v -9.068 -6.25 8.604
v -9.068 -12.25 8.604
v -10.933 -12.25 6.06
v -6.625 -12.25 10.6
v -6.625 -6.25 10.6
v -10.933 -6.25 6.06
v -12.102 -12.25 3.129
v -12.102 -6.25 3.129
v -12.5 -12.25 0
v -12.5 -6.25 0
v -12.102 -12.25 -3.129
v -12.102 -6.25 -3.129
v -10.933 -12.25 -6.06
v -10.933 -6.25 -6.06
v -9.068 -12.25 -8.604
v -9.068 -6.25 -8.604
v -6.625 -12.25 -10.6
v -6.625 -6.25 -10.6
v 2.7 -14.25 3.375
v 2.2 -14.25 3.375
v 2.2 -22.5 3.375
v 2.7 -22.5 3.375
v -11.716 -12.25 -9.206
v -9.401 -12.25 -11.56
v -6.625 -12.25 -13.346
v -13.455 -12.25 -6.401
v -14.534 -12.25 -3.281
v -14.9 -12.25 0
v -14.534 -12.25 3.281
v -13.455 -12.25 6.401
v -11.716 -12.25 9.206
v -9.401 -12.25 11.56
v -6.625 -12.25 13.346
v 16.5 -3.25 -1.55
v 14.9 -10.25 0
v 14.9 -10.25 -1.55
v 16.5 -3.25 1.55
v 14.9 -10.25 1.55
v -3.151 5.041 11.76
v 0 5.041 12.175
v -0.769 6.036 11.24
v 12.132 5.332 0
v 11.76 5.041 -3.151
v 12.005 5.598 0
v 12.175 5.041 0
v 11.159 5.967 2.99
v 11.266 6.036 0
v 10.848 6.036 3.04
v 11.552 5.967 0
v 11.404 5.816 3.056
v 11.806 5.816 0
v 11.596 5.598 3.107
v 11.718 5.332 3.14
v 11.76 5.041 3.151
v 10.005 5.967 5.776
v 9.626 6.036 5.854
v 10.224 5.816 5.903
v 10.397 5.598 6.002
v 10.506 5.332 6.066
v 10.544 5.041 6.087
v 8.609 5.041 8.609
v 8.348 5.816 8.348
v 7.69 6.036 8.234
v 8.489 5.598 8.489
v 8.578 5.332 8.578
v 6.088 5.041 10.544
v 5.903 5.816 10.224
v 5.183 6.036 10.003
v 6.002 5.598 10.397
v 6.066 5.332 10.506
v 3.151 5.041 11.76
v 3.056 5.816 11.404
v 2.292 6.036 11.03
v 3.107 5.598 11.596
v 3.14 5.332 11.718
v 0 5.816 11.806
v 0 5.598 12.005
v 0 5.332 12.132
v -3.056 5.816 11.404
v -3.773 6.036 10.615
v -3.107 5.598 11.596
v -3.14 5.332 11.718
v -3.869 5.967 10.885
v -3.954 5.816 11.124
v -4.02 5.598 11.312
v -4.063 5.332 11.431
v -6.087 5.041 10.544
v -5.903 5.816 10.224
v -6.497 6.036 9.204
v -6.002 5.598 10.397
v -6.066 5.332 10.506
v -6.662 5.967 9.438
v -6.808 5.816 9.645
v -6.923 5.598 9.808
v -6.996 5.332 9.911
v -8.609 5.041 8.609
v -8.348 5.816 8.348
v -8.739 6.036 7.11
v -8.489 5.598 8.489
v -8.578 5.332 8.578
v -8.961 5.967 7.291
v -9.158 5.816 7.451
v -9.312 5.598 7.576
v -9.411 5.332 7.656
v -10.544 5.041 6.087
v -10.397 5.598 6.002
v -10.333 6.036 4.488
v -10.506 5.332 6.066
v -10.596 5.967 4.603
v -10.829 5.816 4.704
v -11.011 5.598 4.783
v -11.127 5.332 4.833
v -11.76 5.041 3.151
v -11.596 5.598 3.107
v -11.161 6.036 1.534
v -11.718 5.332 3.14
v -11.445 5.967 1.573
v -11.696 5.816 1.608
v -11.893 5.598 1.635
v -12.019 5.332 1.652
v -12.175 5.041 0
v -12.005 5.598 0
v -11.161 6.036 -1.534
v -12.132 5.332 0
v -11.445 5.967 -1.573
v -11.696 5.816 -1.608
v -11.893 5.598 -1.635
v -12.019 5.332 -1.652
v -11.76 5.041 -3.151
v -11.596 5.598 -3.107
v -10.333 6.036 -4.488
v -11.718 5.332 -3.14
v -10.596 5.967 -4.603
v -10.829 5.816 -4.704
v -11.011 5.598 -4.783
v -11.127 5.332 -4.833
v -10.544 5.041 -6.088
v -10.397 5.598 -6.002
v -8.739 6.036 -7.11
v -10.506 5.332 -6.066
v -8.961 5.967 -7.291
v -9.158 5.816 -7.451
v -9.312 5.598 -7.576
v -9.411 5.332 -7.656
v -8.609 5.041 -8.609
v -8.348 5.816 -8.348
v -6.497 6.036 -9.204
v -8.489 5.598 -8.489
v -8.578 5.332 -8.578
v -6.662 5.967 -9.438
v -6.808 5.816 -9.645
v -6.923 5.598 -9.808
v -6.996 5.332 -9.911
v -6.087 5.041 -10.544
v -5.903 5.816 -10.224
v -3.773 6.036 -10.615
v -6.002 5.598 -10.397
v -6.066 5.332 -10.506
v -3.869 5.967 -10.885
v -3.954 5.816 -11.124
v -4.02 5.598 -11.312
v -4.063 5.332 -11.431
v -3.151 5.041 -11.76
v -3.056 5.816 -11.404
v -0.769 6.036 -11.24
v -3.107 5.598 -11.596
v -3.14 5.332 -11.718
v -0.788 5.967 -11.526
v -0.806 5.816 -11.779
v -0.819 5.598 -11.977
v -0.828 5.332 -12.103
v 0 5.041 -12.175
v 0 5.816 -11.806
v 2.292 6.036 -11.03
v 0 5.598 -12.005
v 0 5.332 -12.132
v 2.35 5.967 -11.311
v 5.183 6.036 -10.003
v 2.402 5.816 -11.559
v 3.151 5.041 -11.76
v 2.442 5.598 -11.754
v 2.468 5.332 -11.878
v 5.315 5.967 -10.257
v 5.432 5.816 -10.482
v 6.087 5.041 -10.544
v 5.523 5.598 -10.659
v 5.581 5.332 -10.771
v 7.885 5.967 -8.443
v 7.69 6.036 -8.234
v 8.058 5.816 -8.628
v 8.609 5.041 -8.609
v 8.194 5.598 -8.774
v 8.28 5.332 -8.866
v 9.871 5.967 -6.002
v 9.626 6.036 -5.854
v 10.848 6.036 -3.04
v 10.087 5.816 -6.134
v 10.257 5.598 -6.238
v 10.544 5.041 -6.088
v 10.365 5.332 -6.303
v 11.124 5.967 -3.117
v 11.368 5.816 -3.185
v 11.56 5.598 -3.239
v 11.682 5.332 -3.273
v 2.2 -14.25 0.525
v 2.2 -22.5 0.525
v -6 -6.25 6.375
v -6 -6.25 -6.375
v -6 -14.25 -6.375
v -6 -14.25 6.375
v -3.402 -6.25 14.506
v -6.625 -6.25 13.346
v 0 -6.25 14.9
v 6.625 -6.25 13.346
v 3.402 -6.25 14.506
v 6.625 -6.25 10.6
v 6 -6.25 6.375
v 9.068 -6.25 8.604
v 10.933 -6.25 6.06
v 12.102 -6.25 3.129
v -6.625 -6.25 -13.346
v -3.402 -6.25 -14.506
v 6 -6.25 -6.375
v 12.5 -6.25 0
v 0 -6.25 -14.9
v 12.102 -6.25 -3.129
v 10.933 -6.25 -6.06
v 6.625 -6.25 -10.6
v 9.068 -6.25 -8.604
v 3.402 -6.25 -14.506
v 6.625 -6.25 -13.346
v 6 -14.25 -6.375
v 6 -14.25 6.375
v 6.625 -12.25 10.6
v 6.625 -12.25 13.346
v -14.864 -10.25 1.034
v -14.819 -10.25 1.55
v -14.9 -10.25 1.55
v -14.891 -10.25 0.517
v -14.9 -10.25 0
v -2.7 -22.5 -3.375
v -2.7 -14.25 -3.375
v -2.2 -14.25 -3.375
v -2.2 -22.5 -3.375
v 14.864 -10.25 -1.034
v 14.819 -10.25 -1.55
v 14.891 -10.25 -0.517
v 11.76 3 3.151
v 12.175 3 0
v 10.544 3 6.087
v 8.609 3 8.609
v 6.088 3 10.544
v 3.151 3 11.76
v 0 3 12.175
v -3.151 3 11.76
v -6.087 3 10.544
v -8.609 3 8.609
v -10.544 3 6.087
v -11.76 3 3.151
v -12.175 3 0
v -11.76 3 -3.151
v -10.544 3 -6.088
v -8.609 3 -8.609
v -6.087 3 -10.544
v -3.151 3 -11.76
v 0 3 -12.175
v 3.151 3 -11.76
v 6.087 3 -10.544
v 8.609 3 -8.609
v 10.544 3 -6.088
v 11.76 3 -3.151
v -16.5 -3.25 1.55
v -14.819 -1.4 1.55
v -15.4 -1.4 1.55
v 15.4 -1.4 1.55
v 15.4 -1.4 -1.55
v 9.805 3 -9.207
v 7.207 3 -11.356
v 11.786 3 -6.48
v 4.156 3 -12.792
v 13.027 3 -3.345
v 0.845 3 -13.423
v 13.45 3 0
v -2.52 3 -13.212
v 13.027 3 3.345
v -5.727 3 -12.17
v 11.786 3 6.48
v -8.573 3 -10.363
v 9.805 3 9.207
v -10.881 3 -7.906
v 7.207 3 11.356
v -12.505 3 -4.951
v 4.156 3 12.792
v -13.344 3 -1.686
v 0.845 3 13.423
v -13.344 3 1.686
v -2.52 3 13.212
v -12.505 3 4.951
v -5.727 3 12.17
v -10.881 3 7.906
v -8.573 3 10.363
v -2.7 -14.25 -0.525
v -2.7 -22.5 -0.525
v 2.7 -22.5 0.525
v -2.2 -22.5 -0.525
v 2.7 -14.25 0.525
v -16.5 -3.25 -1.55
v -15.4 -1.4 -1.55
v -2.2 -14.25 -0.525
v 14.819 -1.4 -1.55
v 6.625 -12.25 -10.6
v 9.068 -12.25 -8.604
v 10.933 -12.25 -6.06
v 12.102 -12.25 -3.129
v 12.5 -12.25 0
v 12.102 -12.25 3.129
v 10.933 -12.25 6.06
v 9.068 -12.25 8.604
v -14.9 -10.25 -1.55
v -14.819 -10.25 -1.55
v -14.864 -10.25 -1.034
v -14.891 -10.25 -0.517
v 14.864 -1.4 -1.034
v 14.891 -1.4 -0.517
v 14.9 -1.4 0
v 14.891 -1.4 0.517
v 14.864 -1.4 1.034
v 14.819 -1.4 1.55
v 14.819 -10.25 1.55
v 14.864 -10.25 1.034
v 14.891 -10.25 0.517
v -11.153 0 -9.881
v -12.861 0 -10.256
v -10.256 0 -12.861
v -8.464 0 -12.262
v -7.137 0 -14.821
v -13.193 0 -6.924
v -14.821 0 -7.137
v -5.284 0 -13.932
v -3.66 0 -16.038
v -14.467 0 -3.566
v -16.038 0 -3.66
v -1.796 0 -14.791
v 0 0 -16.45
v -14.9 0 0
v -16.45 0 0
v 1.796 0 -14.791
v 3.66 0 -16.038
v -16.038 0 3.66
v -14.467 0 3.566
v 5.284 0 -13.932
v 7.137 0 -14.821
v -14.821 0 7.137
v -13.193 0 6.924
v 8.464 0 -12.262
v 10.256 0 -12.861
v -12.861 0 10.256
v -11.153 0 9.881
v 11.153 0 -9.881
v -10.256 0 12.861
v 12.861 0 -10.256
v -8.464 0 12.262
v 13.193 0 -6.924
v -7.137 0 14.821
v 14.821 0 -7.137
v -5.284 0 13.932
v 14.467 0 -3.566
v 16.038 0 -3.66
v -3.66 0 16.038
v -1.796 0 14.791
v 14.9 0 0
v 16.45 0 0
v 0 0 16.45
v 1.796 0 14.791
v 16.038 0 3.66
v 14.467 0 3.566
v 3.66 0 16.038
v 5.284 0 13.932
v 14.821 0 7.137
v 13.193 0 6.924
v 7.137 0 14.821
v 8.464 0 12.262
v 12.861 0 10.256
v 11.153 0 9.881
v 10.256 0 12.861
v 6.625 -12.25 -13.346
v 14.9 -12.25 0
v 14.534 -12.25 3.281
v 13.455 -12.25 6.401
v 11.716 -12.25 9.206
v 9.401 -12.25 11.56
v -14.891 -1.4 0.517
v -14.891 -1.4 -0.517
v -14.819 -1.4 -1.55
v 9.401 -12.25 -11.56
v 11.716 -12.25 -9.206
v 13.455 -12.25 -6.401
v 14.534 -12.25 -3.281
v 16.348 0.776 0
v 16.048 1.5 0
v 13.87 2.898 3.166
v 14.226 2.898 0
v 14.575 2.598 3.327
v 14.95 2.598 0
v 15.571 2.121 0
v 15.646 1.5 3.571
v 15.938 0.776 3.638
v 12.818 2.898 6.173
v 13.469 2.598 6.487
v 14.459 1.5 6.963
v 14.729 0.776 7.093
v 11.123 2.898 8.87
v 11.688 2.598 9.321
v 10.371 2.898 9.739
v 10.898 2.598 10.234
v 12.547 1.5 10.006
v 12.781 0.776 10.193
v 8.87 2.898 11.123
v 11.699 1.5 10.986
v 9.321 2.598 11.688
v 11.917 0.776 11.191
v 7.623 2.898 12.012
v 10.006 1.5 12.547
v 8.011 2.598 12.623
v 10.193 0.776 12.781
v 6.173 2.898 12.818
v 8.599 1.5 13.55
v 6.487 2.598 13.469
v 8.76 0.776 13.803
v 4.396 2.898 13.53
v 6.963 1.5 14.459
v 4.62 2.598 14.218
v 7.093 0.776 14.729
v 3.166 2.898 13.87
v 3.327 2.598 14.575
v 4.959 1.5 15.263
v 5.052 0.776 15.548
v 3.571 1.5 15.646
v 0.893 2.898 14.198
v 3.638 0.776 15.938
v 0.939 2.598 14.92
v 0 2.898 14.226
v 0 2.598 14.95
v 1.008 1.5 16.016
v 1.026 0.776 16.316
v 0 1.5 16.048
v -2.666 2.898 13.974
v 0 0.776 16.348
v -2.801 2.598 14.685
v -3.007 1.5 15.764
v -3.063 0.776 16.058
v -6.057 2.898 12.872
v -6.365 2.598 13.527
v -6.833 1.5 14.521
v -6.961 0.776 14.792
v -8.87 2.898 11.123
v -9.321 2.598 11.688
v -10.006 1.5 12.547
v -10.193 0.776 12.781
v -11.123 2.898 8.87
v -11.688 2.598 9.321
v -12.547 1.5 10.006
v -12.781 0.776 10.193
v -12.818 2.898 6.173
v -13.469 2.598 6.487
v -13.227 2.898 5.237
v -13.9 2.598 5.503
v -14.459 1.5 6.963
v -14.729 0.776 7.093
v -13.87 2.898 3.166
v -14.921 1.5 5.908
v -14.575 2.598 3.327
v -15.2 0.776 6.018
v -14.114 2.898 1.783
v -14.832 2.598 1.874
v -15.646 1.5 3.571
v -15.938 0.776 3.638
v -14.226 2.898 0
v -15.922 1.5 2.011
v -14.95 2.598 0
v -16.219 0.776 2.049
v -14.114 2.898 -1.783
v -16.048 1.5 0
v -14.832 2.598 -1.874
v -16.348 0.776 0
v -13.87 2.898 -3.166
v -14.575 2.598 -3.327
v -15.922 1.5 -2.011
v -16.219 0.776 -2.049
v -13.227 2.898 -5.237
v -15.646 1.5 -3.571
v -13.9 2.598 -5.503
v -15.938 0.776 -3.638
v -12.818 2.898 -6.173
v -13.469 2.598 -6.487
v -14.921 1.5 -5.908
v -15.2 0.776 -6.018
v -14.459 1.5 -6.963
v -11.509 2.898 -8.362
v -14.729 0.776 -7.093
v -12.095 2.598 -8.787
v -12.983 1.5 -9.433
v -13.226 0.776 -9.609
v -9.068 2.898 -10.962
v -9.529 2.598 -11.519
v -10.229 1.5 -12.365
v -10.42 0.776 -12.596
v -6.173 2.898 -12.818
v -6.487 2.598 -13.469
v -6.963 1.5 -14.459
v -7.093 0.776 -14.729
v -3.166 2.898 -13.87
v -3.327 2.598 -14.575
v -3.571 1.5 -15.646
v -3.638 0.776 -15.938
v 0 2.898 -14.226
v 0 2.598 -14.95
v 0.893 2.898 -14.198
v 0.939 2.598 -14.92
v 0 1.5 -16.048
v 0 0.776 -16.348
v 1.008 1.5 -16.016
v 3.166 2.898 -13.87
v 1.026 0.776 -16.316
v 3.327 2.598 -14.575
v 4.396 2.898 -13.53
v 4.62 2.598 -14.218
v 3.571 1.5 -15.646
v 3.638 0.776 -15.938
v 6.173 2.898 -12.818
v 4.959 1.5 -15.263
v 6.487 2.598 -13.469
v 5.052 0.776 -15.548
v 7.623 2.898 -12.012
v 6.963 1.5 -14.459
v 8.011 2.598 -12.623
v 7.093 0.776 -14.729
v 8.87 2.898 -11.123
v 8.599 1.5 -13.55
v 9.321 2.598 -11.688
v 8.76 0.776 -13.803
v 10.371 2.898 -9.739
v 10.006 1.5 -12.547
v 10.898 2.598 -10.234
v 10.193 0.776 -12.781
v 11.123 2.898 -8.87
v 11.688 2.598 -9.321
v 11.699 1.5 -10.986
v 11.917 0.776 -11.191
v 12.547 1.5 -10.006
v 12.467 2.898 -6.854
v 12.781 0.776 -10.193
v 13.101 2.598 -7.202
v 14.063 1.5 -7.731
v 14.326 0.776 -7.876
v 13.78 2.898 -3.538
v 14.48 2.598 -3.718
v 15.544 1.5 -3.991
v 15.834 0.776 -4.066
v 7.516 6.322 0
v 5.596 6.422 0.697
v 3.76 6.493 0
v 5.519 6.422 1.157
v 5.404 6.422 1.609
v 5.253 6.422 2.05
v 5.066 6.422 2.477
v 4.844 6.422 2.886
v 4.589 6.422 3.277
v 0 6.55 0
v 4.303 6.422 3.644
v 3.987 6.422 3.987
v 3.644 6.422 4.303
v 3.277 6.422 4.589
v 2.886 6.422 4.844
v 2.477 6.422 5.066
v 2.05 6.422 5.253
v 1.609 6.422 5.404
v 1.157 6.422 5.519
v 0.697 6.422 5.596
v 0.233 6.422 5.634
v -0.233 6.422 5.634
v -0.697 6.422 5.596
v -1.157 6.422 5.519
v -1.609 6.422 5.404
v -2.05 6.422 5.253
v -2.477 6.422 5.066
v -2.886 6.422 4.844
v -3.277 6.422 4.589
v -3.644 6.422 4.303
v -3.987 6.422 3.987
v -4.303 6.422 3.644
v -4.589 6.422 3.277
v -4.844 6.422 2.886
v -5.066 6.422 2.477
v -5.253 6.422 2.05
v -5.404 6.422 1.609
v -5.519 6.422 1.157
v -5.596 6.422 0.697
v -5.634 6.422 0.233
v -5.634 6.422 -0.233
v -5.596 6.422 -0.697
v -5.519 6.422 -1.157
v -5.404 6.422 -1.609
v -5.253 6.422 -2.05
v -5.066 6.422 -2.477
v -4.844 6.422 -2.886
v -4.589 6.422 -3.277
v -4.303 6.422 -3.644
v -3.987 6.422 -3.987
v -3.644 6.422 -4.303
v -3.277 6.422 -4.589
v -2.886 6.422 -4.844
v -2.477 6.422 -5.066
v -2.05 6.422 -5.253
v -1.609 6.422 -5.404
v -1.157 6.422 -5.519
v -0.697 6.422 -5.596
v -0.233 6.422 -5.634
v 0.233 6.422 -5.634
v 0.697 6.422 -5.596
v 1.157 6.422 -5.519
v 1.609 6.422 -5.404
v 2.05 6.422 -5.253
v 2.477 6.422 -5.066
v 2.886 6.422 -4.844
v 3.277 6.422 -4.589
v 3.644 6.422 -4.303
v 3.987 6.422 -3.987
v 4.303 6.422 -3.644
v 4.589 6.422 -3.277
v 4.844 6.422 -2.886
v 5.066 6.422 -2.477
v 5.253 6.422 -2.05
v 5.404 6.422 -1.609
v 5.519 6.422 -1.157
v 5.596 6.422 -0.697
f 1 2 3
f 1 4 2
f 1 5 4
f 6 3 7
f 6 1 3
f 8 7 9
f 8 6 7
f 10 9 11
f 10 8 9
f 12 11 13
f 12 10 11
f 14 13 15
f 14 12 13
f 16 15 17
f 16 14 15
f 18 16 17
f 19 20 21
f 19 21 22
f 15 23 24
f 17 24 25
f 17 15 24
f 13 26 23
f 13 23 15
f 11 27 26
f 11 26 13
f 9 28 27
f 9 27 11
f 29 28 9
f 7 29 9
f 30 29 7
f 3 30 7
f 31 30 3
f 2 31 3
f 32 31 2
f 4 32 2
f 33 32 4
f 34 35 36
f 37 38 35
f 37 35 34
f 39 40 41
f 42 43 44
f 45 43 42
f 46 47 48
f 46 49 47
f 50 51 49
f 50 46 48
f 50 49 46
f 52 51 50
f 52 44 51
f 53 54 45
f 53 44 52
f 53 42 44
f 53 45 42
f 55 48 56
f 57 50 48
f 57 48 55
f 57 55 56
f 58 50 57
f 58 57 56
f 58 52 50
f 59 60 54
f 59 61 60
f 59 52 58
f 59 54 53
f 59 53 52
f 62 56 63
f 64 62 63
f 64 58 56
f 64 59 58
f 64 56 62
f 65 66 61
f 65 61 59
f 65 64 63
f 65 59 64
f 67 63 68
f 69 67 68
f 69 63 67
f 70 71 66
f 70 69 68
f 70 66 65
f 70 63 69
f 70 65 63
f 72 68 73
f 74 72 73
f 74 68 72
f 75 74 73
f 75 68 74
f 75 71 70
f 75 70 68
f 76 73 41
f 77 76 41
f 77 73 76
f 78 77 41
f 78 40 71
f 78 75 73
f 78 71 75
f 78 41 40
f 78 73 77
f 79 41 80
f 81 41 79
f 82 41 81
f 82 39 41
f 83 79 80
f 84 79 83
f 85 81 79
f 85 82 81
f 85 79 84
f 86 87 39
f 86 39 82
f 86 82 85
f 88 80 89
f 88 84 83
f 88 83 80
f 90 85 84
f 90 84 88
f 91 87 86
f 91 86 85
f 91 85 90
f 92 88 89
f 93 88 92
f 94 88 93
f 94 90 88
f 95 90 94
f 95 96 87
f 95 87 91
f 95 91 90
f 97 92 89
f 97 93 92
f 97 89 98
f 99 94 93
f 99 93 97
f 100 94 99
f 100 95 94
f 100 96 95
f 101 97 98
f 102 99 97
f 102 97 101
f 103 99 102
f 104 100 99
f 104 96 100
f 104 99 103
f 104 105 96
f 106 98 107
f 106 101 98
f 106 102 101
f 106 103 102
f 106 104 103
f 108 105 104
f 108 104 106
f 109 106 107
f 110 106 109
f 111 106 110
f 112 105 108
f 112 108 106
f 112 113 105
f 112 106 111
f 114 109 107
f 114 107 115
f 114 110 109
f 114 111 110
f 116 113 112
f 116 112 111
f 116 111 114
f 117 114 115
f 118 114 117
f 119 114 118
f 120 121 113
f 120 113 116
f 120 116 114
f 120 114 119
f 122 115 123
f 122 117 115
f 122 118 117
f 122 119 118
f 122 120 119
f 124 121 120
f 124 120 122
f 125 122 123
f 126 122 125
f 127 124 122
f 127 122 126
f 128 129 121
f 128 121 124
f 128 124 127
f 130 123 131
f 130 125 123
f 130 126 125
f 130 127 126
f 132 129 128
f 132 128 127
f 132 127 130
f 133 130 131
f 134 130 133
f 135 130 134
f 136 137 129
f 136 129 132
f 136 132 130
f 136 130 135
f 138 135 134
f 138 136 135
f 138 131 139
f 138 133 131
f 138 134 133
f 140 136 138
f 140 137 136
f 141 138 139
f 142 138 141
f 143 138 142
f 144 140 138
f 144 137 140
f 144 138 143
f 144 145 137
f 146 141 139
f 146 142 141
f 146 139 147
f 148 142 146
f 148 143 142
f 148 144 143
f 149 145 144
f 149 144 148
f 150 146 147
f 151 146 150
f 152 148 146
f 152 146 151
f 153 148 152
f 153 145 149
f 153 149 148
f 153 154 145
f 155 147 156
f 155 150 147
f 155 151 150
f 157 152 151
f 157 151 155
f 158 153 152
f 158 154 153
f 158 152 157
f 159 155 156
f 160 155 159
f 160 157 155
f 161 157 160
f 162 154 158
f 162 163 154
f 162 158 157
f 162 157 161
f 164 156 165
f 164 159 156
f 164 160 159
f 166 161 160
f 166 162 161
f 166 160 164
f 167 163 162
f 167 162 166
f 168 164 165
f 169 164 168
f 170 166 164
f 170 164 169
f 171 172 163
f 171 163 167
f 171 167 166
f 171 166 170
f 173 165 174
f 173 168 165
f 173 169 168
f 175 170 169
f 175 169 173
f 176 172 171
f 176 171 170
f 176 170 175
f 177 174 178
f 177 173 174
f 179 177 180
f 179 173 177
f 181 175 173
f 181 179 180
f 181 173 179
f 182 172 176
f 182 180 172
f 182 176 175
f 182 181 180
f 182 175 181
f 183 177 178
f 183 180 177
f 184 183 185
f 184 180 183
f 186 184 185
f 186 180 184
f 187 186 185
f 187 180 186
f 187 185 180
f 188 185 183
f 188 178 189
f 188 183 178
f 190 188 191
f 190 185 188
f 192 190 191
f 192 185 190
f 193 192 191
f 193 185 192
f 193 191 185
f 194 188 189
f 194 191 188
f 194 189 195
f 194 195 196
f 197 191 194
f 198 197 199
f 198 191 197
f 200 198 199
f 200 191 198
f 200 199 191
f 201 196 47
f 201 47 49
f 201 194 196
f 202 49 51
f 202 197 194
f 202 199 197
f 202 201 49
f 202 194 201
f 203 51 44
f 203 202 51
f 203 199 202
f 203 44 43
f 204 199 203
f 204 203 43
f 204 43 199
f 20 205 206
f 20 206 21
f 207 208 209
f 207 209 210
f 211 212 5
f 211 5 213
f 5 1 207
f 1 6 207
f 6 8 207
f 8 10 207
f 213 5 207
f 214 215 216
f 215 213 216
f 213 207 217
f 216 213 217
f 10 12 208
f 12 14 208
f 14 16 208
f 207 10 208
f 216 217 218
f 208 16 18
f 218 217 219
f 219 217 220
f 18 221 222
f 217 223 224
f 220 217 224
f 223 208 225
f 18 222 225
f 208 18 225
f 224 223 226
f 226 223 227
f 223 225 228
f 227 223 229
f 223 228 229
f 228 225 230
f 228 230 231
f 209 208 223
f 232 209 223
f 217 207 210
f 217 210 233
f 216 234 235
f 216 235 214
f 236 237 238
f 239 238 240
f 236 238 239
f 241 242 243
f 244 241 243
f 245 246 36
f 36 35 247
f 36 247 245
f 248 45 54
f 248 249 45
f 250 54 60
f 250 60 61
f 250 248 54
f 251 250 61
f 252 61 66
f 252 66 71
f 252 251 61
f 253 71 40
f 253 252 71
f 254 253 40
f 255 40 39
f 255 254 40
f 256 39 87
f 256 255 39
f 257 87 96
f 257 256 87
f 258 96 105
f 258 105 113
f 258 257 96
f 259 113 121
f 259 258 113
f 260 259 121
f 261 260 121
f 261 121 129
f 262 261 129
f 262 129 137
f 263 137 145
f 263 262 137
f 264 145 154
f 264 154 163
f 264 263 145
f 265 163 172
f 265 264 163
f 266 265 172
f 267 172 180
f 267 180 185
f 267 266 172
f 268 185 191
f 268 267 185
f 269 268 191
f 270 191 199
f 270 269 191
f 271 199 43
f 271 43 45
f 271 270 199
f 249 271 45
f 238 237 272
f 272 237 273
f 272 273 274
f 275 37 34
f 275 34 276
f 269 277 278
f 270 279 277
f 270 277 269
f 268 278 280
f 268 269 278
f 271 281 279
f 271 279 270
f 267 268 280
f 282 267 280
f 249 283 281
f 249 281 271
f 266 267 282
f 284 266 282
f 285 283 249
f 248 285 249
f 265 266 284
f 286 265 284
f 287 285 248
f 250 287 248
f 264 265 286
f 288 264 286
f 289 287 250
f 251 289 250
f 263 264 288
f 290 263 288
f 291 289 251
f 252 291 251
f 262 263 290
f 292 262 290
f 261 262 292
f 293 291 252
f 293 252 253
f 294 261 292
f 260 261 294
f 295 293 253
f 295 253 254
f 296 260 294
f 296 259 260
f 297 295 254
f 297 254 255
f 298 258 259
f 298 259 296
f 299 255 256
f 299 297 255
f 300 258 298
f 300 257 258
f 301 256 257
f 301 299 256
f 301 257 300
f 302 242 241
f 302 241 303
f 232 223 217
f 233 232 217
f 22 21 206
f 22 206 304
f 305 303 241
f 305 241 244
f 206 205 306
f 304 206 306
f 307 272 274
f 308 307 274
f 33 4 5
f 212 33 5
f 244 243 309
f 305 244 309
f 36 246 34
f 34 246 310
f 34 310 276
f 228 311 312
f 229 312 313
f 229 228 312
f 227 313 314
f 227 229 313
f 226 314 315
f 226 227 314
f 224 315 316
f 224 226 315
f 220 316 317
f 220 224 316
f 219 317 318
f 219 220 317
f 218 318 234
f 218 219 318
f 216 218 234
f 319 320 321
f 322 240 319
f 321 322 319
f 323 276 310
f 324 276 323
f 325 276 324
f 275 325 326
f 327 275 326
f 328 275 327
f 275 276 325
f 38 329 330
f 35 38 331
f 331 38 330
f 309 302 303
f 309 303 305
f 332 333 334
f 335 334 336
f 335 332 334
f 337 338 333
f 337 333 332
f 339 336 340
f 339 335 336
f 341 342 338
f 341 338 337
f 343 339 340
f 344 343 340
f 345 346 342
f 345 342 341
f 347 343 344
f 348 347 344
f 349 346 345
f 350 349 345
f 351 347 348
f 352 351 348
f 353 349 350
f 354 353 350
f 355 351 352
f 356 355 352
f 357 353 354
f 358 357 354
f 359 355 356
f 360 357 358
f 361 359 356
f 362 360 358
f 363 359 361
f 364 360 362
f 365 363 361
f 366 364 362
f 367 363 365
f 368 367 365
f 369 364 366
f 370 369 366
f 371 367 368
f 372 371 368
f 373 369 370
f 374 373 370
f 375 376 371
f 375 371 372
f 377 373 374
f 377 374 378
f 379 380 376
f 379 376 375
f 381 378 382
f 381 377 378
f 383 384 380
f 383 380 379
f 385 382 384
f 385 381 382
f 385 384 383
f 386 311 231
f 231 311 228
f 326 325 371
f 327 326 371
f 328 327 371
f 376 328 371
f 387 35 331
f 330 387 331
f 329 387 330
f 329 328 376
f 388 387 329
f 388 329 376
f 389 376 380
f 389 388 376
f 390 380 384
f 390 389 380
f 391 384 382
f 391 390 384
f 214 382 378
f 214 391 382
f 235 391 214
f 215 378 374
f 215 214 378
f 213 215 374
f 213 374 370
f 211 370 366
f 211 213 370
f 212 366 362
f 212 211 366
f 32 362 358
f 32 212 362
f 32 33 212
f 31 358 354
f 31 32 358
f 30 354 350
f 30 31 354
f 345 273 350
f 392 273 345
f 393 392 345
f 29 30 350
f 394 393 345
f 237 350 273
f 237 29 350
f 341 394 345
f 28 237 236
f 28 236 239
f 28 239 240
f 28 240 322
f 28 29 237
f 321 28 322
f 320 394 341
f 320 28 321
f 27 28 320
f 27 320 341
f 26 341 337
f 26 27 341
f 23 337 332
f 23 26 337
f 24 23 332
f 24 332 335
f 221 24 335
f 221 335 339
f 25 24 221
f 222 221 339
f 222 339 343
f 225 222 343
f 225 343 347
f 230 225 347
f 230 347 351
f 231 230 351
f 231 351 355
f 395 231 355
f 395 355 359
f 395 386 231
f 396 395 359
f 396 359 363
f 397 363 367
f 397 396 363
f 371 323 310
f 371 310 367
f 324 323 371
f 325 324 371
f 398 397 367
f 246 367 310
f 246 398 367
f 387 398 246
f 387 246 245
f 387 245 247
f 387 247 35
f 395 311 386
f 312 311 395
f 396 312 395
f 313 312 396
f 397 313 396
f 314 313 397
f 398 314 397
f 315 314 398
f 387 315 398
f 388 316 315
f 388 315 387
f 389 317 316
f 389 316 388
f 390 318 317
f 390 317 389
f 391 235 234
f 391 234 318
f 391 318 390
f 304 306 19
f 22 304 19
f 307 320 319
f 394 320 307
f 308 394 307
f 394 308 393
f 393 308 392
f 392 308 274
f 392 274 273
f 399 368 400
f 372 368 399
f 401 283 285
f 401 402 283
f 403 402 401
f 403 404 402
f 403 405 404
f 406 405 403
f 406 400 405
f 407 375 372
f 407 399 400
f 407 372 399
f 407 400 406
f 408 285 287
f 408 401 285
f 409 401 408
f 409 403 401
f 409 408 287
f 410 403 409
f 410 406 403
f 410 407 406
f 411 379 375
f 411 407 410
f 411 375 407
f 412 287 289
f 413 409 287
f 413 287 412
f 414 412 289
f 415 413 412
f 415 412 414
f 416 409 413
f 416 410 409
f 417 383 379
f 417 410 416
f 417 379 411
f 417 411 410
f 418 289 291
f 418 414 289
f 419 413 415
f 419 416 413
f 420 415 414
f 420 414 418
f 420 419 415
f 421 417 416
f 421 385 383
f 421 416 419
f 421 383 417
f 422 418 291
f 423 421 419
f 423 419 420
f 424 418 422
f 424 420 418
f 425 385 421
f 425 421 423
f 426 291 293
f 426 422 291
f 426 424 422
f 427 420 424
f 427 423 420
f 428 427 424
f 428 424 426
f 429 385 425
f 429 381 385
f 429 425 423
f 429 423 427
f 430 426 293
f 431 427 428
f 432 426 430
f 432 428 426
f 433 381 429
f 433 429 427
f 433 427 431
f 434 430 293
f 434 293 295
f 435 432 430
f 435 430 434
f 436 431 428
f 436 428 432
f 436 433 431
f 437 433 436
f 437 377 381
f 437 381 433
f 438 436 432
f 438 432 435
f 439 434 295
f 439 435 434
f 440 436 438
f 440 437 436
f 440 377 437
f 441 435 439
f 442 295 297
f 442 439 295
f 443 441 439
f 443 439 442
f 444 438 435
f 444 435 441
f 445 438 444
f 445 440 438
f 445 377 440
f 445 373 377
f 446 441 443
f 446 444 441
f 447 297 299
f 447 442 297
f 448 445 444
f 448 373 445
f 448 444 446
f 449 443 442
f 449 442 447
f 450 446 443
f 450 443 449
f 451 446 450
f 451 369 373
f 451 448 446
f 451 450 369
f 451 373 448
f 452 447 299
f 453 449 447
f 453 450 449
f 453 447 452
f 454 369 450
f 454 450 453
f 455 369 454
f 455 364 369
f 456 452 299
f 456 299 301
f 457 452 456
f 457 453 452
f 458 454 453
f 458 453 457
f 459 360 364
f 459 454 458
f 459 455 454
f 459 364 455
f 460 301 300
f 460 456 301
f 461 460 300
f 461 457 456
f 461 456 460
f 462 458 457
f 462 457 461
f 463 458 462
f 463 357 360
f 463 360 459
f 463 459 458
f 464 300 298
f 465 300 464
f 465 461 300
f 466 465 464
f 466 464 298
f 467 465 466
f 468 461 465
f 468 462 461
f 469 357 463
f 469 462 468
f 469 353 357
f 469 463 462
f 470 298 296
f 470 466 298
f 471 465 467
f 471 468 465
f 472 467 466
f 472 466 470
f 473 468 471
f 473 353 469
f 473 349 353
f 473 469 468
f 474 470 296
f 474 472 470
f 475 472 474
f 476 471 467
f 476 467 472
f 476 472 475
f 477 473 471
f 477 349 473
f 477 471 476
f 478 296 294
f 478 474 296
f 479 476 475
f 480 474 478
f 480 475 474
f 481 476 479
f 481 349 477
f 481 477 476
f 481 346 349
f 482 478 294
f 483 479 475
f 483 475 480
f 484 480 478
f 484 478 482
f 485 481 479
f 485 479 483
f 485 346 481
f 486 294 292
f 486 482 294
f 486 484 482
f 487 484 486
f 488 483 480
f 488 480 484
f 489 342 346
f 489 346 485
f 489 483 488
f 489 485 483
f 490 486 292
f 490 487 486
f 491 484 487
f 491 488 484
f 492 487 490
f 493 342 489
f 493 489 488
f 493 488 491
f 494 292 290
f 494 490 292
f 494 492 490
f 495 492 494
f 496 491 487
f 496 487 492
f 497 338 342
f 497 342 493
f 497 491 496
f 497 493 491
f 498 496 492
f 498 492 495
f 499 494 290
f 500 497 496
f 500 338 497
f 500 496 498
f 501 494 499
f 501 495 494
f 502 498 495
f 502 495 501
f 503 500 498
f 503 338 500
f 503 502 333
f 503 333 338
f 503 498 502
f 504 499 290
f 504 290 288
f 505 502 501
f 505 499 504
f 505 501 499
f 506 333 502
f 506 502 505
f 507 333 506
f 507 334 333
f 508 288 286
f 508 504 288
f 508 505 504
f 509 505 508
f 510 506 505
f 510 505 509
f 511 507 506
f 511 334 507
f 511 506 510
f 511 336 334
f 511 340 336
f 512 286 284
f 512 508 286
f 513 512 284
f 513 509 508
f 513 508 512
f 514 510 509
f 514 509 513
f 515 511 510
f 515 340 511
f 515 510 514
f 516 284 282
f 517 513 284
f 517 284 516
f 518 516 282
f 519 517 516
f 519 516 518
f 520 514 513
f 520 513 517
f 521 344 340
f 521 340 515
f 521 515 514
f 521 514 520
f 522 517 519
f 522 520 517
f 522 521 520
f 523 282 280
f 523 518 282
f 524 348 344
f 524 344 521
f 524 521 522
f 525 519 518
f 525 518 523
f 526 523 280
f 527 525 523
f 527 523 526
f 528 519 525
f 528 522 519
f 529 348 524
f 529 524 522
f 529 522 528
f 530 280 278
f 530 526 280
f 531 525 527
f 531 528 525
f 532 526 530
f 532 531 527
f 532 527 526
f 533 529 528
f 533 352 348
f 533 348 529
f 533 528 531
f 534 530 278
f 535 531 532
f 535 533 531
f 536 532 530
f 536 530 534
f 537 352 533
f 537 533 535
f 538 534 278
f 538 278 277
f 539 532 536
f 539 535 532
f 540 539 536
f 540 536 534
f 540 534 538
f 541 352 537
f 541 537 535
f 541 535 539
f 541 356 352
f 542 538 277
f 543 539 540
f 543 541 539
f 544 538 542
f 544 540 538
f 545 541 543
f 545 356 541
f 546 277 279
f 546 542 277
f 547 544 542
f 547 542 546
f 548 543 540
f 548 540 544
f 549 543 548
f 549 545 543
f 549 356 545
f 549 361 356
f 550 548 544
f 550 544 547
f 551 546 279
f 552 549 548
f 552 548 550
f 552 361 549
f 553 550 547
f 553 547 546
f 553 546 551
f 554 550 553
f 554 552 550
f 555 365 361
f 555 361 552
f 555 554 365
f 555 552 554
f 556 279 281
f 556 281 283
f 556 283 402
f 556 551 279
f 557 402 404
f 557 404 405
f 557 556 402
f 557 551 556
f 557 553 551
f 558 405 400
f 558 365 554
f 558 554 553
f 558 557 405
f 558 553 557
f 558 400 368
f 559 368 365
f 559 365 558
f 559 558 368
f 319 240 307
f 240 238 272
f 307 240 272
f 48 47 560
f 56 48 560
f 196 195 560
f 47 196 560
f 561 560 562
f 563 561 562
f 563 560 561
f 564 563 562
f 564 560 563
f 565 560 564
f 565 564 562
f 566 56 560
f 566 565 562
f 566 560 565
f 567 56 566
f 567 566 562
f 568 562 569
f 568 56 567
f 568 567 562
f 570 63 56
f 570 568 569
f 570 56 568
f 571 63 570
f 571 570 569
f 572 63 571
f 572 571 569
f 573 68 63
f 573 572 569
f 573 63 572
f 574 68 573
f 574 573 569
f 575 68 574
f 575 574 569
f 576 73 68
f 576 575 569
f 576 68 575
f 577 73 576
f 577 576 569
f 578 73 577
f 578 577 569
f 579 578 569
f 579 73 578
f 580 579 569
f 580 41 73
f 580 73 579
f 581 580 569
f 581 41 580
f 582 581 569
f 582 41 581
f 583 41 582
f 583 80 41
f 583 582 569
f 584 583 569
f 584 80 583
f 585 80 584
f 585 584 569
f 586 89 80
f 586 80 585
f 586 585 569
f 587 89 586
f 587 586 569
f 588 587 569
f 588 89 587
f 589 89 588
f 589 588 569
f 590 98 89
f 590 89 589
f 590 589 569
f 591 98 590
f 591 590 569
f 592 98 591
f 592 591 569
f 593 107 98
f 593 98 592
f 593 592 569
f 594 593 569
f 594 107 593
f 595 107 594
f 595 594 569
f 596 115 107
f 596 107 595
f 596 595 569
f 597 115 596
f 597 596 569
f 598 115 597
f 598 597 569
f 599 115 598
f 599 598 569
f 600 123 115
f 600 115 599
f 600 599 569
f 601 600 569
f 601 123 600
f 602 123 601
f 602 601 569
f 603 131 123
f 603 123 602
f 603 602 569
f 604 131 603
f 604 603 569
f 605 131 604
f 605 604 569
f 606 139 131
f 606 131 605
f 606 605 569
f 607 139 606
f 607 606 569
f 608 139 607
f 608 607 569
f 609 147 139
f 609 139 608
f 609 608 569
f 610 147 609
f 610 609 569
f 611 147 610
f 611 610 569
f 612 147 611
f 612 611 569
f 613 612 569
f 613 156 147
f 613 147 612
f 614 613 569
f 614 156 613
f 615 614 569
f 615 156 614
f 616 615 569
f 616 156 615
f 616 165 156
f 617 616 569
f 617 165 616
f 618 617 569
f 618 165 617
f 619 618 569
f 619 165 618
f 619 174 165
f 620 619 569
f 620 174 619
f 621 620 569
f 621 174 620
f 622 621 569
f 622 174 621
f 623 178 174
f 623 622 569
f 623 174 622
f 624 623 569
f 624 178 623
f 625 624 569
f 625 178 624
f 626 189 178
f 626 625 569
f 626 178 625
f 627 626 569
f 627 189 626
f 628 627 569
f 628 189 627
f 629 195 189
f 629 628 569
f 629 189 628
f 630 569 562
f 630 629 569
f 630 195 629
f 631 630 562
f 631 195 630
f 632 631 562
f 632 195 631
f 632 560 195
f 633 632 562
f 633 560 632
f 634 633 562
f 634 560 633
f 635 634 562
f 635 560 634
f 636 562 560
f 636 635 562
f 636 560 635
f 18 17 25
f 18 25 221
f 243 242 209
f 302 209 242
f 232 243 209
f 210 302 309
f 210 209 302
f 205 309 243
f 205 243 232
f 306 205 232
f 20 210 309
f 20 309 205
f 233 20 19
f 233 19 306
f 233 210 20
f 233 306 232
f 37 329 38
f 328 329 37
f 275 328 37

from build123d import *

# Parameters (mm, degrees)
SKETCH2_W               = 13.25
SKETCH2_H               = 6
CUT_EXTRUDE1_DEPTH      = 17.45
CUT_EXTRUDE1_DEPTH_BACK = 17.45
BOSS_EXTRUDE1_DEPTH     = 1.55
SKETCH4_W               = 12
SKETCH4_H               = 12.75
BOSS_EXTRUDE2_DEPTH     = 8
SKETCH5_W               = 0.5
SKETCH5_H               = 2.85
BOSS_EXTRUDE3_DEPTH     = 8.25


with BuildPart() as part:
    # Sketch1 → Revolve1 (revolve)
    with BuildSketch(Plane.XY):
        with BuildLine():
            Line((16.45, 0), (14.9, 0))
            Line((14.9, 0), (14.9, -12.25))
            Line((14.9, -12.25), (12.5, -12.25))
            Line((12.5, -12.25), (12.5, -6.25))
            Line((12.5, -6.25), (0, -6.25))
            Line((0, -6.25), (0, 6.55))
            ThreePointArc((0, 6.55), (5.638841208, 6.421540892), (11.26598272, 6.0364301))
            ThreePointArc((11.26598272, 6.0364301), (11.913573869, 5.714750188), (12.175, 5.040577629))
            Line((12.175, 5.040577629), (12.175, 3))
            Line((12.175, 3), (13.45, 3))
            ThreePointArc((13.45, 3), (15.571320344, 2.121320344), (16.45, 0))
        make_face()
    revolve(axis=Axis((0, 7.971043953, 0), (0, -1, 0)))

    # Sketch2 → Cut-Extrude1 (cut, two sides)
    with BuildSketch(Plane.XY) as cut_extrude1_sk:
        with Locations((0, -9.25)):
            Rectangle(SKETCH2_W, SKETCH2_H)
    extrude(amount=CUT_EXTRUDE1_DEPTH, mode=Mode.SUBTRACT)
    extrude(cut_extrude1_sk.sketch, amount=-CUT_EXTRUDE1_DEPTH_BACK, mode=Mode.SUBTRACT)

    # Sketch3 → Boss-Extrude1 (add, symmetric)
    with BuildSketch(Plane.XY):
        Polygon((14.9, -10.25), (16.5, -3.25), (15.4, -1.4), (13.9, -1.4), (13.9, -10.25), align=None)
    boss_extrude1 = extrude(amount=BOSS_EXTRUDE1_DEPTH, both=True)

    # Mirror1: Boss-Extrude1 across plane
    add(boss_extrude1.mirror(Plane(origin=(0, 0, 0), x_dir=(0, 0, 1), z_dir=(1, 0, 0))))

    # Sketch4 → Boss-Extrude2 (add)
    with BuildSketch(Plane.XZ.offset(6.25)):
        Rectangle(SKETCH4_W, SKETCH4_H)
    extrude(amount=BOSS_EXTRUDE2_DEPTH)

    # Sketch5 → Boss-Extrude3 (add)
    with BuildSketch(Plane.XZ.offset(14.25)):
        with Locations((2.45, 1.95)):
            Rectangle(SKETCH5_W, SKETCH5_H)
        with Locations((-2.45, -1.95)):
            Rectangle(SKETCH5_W, SKETCH5_H)
    extrude(amount=BOSS_EXTRUDE3_DEPTH)


solid = part.part
